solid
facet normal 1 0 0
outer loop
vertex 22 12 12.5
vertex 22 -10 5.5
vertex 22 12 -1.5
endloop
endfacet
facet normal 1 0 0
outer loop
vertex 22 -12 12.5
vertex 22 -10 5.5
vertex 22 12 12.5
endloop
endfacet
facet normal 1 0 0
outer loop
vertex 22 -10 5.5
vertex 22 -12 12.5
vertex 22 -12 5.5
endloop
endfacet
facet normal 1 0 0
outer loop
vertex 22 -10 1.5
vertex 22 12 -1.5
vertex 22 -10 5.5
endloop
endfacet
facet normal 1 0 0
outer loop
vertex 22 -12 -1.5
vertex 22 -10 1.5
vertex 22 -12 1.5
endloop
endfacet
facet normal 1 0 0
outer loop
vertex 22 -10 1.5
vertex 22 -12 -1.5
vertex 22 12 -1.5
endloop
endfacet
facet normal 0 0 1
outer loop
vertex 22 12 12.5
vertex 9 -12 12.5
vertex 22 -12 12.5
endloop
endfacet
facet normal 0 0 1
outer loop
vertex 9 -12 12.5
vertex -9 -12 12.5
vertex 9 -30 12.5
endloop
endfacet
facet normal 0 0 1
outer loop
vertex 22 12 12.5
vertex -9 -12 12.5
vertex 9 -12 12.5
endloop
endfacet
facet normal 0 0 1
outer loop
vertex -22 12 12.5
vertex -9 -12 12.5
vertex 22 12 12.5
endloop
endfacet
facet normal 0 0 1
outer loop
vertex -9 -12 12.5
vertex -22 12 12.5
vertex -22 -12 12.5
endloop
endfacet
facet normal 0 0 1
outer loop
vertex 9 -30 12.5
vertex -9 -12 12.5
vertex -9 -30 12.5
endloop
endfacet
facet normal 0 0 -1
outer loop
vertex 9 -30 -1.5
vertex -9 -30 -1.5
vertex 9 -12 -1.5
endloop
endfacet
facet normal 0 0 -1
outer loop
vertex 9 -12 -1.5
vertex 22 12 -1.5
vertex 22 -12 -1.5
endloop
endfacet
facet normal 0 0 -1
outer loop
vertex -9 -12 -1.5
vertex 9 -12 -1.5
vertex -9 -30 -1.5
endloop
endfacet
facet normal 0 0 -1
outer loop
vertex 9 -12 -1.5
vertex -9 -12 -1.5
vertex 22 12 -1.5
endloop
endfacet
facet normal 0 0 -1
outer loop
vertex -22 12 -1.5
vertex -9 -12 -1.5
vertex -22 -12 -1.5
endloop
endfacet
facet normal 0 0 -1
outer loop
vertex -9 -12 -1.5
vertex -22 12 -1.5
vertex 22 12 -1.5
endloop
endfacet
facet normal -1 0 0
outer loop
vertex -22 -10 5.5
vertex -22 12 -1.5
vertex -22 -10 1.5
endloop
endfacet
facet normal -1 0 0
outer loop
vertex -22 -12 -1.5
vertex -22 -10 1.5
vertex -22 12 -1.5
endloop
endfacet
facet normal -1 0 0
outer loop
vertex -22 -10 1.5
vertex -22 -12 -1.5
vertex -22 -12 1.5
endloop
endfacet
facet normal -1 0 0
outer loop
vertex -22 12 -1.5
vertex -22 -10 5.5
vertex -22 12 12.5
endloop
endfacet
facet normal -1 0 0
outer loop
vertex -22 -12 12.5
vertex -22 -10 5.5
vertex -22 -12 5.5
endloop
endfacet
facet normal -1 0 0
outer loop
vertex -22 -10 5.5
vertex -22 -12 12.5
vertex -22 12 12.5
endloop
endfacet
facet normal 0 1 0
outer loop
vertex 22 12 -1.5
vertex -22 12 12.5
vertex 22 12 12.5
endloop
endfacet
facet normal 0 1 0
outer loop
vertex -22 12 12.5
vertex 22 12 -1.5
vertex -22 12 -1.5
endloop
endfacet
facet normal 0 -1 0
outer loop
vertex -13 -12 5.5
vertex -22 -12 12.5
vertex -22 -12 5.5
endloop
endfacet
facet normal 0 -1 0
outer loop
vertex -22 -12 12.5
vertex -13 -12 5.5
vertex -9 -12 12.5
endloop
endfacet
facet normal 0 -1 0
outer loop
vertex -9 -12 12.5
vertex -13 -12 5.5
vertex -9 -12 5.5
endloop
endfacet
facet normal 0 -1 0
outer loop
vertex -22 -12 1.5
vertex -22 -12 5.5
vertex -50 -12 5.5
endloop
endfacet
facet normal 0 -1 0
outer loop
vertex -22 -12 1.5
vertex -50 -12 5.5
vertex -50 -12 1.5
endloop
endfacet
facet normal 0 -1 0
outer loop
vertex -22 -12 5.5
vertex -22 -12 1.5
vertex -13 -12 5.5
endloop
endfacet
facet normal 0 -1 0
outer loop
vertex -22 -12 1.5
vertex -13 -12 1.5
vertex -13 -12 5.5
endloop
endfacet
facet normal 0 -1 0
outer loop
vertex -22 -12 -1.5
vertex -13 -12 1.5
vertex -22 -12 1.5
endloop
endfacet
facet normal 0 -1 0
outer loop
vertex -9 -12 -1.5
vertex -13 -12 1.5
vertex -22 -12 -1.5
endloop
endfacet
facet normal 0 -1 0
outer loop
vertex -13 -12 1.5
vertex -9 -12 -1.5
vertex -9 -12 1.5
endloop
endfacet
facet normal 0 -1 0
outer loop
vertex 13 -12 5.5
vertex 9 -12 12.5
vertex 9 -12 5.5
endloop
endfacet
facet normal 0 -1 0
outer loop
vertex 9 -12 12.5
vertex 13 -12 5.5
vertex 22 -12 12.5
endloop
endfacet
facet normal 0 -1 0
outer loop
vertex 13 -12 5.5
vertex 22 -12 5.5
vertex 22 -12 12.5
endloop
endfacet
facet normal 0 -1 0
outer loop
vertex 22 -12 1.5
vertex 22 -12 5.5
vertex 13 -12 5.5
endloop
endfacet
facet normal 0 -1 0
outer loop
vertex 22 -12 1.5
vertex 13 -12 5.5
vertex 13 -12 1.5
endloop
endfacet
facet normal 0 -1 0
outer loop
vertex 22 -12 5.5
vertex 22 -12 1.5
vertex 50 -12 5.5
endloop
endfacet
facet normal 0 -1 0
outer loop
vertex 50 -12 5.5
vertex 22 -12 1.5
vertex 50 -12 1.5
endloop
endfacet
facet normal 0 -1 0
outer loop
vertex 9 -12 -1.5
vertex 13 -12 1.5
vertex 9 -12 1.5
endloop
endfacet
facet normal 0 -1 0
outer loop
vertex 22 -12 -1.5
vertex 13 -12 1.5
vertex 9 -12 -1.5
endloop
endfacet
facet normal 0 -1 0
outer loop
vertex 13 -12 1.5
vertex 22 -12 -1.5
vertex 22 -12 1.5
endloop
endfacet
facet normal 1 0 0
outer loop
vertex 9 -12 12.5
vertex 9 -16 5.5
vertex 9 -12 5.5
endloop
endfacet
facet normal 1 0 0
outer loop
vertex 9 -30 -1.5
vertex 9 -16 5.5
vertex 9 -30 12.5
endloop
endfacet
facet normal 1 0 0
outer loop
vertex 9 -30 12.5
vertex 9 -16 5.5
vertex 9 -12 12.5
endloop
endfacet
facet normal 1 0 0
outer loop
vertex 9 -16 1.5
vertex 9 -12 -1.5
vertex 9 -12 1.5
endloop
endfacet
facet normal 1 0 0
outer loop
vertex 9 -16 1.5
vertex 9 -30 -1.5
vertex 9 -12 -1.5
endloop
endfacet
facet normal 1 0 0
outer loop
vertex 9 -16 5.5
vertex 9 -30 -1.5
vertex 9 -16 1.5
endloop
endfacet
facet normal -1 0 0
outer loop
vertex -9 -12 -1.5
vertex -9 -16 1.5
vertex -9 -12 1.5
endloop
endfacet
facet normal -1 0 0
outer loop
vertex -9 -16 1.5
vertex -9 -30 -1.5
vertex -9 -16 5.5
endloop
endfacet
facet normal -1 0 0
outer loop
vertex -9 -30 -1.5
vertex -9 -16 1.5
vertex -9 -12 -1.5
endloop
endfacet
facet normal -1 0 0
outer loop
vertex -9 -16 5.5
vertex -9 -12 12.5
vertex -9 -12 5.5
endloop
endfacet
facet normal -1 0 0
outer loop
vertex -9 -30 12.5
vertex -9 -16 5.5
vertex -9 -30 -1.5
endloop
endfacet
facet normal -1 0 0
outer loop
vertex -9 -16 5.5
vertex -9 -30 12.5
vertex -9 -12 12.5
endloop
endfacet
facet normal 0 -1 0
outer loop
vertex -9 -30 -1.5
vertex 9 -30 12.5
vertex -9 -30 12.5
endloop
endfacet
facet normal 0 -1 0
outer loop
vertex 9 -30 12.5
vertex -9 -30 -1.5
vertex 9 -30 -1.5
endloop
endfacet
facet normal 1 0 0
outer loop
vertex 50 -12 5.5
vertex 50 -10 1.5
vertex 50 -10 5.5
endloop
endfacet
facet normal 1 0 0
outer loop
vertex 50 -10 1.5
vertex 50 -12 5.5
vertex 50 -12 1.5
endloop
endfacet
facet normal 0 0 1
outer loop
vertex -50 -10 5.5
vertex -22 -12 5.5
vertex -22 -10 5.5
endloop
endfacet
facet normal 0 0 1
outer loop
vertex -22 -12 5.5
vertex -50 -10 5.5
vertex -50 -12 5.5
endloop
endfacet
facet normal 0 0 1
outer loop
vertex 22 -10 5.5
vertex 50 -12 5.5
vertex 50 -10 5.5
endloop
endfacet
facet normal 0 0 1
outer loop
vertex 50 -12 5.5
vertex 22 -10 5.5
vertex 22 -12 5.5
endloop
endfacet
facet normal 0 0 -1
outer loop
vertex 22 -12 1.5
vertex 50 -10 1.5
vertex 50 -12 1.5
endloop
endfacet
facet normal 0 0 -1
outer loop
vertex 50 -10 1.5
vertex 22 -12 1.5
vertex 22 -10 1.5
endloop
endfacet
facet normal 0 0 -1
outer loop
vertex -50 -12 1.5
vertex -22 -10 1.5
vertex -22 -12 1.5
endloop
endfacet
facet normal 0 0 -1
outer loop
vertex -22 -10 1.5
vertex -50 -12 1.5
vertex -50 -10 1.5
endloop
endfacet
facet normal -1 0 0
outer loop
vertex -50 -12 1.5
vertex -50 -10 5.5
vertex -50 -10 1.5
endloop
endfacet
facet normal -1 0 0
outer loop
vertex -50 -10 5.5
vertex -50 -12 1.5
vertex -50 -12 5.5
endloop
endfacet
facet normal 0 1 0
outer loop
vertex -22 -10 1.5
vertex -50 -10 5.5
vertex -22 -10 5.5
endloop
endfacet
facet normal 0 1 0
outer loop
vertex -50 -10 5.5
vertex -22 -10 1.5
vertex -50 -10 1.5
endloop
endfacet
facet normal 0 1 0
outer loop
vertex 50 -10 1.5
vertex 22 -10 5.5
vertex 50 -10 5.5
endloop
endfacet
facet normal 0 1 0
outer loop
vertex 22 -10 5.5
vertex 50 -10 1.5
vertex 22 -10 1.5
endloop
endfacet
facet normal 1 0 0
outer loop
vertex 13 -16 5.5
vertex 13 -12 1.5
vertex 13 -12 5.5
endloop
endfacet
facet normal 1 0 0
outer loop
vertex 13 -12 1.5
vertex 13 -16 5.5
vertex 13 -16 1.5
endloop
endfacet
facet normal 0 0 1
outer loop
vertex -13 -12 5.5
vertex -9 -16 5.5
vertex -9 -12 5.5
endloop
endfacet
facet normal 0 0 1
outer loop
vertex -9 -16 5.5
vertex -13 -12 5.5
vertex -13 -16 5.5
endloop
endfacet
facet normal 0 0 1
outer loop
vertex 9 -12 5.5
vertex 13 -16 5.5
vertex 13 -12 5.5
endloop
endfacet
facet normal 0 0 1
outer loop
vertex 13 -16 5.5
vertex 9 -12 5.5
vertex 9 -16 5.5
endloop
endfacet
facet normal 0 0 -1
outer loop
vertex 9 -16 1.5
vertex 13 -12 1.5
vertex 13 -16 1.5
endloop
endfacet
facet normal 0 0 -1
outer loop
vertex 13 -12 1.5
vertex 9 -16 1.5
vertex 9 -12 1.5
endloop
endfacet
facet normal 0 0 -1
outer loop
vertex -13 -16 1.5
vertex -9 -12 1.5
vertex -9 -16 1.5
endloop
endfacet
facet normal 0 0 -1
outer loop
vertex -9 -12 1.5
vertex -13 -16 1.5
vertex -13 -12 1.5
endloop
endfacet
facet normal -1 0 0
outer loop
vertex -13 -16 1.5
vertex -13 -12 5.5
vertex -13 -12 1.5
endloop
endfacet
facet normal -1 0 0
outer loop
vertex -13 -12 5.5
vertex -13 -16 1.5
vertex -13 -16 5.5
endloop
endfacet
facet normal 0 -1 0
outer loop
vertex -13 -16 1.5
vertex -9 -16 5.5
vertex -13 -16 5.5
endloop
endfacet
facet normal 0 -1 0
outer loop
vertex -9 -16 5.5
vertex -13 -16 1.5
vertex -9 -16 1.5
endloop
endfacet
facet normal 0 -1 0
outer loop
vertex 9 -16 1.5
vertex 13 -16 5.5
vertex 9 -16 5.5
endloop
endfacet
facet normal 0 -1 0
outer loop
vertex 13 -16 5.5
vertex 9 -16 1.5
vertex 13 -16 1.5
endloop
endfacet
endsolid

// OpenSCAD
module holder_hole(
    width = 50,
    deep = 30,
    height = 7,
    wall = 2,
    hole_length = 20,
    cover_mortize_length = 4,
    gap = 5
){
    union(){
    
        translate([-width/2+wall+gap/2,-deep/2+wall+gap/2,-height/2+wall]){
            cube([width-2*wall-gap,deep-2*wall-gap,2*height],center=false);
        }
        
        translate([-hole_length/2+gap/2,-deep,-height/2+wall]){
            cube([hole_length-gap,deep,2*height],center=false);
        }
        
        translate([-width,-deep/2+wall+gap/2,height/2-wall]){
            cube([width*2,cover_mortize_length-gap,wall*2],center=false);
        }
        
        cvr_bottom_mortize_len = hole_length + cover_mortize_length*2;
        translate([-cvr_bottom_mortize_len/2+gap/2,-deep/2-wall/2,height/2-wall]){
            cube([cvr_bottom_mortize_len-gap,wall*2,wall*2],center=false);
        }
    }
}

holder_hole(gap=2);
%holder_hole(gap=0);
